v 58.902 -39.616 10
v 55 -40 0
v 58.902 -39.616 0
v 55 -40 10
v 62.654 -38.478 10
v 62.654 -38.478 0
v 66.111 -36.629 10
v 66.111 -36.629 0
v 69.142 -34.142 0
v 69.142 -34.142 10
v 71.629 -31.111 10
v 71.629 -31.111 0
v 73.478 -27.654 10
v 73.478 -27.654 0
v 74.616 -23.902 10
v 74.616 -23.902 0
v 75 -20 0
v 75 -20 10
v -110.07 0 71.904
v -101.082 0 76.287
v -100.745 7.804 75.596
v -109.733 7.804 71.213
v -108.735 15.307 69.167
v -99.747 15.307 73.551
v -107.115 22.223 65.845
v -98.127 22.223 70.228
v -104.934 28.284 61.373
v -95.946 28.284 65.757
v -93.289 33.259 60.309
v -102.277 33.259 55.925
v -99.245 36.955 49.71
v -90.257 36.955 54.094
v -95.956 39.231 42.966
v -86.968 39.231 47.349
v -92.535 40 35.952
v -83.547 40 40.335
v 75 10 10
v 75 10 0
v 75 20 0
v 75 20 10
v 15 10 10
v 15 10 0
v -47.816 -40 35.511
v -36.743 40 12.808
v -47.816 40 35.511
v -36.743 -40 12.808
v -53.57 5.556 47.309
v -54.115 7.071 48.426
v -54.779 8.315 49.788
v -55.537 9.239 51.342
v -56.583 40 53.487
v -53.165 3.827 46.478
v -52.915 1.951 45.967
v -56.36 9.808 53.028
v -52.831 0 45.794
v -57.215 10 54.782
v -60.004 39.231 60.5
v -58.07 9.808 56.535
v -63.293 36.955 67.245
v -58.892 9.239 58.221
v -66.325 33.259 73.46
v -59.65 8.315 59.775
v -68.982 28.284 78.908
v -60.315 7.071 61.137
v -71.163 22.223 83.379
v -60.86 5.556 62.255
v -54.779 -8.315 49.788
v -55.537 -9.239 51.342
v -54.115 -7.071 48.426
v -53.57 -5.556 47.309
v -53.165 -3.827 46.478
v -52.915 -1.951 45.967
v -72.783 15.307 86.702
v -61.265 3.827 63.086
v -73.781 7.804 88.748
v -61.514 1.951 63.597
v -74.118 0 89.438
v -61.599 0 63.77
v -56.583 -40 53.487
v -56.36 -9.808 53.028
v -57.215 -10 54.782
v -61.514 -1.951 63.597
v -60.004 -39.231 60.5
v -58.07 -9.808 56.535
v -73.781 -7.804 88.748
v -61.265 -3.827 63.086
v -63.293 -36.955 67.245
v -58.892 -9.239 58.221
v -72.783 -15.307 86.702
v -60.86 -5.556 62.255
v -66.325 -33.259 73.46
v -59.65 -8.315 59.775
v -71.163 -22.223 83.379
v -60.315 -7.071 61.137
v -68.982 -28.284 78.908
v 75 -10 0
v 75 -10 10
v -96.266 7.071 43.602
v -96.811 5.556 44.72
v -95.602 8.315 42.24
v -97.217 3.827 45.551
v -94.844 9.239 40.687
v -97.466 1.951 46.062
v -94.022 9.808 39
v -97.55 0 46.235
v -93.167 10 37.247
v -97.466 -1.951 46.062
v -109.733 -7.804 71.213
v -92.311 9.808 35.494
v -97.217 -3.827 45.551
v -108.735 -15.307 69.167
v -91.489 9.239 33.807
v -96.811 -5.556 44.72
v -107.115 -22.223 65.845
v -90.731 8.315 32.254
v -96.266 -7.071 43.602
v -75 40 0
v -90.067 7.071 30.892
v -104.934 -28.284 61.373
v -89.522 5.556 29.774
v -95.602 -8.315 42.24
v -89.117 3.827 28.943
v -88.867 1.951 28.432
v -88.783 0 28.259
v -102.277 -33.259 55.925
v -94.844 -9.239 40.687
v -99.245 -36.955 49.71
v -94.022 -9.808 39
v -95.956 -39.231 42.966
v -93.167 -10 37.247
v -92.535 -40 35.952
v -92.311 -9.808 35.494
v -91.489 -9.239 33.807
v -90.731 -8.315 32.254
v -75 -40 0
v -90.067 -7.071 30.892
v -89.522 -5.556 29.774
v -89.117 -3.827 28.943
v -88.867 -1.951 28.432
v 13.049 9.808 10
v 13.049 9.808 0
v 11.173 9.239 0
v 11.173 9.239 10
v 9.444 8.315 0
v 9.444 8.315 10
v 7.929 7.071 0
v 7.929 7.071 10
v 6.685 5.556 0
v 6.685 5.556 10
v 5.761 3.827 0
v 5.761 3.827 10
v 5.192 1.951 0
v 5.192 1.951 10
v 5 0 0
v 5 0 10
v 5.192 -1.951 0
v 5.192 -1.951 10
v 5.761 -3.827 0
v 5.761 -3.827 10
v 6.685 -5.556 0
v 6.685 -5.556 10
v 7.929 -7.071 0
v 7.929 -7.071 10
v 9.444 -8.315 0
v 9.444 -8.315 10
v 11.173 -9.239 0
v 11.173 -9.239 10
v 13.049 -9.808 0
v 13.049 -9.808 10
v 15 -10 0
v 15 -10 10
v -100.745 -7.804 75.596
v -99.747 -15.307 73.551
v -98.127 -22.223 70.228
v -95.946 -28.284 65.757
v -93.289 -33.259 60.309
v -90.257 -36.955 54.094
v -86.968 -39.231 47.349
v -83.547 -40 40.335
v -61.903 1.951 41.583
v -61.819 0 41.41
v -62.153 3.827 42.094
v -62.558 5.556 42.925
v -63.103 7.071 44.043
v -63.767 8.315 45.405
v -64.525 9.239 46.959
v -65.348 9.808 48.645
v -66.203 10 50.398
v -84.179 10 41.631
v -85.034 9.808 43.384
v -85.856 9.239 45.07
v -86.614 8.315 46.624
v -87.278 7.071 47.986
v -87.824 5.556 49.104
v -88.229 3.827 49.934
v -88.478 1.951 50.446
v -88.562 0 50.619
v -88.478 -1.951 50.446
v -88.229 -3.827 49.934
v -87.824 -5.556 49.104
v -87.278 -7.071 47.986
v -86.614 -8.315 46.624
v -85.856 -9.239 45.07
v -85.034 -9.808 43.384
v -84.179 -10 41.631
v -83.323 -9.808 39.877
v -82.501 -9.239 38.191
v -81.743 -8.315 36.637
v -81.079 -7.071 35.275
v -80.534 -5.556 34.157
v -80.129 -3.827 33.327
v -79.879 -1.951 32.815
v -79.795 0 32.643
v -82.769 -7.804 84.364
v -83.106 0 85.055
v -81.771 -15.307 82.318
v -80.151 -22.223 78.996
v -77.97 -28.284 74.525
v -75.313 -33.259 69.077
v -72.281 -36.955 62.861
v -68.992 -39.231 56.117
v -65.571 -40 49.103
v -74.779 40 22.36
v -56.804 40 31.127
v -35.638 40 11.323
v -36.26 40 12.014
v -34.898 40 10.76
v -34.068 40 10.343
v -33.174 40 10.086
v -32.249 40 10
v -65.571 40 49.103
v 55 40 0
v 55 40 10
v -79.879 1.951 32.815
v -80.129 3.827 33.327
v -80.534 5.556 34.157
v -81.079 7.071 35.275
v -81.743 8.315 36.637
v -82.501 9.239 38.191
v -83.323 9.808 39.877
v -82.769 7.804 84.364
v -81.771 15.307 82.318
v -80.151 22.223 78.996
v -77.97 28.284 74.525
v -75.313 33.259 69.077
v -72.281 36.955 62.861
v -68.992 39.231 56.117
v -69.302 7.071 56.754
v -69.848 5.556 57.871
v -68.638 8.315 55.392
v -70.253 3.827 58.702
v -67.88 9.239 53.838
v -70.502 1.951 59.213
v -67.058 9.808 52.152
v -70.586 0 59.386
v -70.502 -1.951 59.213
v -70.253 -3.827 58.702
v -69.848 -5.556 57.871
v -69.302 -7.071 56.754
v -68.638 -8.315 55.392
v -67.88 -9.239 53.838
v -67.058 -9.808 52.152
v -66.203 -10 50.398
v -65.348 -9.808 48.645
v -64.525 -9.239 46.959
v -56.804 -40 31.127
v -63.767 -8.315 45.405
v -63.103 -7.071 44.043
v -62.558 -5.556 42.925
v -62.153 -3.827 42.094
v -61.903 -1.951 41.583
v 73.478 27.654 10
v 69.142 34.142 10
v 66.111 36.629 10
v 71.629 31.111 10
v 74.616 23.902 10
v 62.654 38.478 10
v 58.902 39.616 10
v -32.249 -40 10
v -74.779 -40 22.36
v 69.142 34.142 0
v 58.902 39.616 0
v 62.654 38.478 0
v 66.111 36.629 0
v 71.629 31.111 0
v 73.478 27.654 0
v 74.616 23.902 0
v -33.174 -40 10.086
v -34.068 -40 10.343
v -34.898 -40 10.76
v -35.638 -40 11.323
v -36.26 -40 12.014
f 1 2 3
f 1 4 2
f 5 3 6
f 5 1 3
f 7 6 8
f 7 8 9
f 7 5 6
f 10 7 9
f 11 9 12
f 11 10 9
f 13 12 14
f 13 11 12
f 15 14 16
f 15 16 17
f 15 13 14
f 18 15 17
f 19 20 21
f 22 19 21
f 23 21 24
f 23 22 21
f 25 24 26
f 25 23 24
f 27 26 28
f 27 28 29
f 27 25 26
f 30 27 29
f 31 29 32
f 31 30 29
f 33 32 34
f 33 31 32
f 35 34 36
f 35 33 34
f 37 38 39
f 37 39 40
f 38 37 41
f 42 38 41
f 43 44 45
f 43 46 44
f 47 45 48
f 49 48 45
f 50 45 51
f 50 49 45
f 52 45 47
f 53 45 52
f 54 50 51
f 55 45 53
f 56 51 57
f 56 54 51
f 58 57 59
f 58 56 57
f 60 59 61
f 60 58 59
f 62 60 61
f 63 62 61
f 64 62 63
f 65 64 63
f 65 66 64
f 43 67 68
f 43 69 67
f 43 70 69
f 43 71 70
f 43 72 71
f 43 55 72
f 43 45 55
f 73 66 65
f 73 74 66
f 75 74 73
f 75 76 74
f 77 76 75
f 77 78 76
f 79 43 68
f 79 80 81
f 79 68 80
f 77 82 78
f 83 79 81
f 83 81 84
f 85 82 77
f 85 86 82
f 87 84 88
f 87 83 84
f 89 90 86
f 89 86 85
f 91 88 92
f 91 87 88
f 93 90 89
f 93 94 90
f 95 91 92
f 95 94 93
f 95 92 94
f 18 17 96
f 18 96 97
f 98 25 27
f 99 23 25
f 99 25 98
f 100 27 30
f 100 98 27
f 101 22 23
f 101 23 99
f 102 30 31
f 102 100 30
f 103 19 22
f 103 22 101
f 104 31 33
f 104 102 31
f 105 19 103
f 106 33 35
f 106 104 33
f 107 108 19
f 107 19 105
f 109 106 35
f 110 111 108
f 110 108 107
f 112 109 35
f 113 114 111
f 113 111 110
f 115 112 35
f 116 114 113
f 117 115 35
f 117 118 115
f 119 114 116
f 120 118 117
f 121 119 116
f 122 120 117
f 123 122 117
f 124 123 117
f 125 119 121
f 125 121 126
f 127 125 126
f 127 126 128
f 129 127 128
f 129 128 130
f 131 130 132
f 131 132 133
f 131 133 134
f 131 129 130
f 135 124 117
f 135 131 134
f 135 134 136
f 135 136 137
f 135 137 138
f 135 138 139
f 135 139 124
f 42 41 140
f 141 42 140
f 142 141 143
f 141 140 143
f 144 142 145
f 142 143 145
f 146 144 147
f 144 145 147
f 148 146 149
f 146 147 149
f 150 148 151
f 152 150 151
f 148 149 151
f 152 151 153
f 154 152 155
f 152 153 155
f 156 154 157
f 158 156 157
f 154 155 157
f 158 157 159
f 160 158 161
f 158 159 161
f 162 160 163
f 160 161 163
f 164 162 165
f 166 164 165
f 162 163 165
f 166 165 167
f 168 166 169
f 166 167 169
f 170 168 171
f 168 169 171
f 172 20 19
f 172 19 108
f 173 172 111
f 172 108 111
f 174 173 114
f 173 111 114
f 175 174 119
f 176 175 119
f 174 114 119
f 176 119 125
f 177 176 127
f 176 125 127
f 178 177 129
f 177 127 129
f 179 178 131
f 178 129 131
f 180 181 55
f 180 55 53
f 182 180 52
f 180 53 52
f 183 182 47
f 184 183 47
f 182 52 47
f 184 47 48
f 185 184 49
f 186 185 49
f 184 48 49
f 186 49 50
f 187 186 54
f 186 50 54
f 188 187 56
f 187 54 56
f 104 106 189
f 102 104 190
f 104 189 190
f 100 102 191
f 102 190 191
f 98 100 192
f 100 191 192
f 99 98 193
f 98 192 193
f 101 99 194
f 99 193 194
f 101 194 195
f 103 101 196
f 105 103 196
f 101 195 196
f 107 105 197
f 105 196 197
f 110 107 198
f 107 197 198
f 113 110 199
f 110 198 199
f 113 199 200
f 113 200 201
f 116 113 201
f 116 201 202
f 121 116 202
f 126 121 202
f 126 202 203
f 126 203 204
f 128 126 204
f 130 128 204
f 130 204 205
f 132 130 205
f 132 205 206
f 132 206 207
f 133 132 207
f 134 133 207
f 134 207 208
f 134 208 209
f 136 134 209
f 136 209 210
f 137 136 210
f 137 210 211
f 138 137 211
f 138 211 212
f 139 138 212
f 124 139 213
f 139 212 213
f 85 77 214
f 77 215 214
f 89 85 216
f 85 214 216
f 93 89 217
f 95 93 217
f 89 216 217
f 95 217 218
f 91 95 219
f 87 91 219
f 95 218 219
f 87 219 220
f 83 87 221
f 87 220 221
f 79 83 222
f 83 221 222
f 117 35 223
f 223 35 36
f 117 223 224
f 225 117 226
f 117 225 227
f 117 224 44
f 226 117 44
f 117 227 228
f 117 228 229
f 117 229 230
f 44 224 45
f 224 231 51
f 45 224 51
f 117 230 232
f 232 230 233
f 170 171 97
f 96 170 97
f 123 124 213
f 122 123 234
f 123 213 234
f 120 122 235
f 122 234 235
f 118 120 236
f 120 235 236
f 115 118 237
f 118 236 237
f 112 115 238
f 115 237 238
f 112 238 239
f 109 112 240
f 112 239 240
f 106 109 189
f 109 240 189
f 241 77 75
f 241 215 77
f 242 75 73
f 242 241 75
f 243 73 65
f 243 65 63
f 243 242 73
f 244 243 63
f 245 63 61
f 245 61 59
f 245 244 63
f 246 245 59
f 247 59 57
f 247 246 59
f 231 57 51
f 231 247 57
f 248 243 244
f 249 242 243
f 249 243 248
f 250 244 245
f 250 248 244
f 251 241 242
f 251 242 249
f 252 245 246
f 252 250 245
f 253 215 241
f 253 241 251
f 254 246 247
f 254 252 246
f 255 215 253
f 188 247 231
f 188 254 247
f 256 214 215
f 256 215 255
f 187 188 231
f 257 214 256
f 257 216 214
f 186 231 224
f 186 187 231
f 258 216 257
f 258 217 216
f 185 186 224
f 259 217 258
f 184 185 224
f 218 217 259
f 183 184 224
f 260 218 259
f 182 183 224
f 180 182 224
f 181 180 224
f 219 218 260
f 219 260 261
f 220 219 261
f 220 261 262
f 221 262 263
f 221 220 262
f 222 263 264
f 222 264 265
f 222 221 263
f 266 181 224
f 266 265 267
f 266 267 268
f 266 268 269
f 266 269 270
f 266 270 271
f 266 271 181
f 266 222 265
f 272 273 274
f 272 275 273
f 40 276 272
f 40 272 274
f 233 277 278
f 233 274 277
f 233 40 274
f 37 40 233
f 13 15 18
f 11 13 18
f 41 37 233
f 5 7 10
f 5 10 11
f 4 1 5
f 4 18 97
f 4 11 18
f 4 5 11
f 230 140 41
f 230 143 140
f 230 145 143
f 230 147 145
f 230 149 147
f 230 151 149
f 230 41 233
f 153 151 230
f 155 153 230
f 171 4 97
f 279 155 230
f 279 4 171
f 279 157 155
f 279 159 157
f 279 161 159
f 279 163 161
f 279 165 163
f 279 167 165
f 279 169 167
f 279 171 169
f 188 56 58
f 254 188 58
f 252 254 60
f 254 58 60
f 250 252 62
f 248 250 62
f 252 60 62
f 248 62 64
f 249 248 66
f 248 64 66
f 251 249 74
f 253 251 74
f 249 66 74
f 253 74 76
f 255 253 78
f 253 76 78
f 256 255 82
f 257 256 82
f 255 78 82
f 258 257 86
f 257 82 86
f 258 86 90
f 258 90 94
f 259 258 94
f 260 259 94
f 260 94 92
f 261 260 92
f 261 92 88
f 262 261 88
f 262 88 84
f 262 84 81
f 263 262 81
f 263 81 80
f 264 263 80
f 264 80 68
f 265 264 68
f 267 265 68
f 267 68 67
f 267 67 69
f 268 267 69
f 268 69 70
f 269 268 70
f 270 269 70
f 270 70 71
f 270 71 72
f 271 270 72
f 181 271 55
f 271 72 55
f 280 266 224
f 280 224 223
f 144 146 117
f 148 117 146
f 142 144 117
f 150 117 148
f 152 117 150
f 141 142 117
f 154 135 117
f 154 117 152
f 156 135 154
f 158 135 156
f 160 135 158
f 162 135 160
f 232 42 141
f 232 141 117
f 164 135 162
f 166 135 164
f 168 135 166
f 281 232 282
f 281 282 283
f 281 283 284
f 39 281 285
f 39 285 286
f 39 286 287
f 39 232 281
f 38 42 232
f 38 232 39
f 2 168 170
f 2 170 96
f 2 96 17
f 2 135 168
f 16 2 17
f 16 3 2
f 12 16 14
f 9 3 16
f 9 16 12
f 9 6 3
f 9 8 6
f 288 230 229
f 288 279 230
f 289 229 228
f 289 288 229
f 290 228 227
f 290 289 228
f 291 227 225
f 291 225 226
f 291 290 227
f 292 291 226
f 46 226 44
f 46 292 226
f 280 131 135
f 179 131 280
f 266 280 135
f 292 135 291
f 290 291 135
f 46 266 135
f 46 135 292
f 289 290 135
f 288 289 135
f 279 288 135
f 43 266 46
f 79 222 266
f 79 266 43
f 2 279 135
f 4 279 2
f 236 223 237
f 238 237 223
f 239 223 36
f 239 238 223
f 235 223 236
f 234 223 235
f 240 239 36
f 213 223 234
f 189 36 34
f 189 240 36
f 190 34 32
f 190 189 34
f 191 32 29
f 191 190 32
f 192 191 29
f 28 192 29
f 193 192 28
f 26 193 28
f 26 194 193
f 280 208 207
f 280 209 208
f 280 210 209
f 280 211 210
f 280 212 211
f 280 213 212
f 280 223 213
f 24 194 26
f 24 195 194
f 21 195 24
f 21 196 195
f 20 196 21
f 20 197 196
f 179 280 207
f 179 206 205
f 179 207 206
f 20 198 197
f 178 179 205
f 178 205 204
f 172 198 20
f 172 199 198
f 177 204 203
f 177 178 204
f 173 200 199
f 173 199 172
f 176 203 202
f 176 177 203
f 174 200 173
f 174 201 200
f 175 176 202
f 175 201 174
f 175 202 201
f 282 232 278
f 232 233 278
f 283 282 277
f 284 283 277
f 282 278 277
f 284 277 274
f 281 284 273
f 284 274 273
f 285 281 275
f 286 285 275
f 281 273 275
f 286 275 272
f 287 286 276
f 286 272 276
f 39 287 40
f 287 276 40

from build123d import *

# Parameters (mm, degrees)
F1_DEPTH      = 40
F1_DEPTH_BACK = 40
F2_R          = 39.99999
F4_DEPTH      = 25
F5_R          = 20
F6_R          = 5
F8_DEPTH      = 63


# Not quite as in the source:
# - a fillet or chamfer is up to 0.001 mm smaller than in the source, because OpenCascade refuses the exact size


with BuildPart() as f1:
    # F0 (on Front) → F1 (new body, two sides)
    with BuildSketch(Plane.XZ) as f1_sk:
        Polygon((-75, 0), (0, 0), (75, 0), (75, 10), (-35.3732482667, 10), (-47.8156610838, 35.5107267975), (-74.1179298912, 89.4383695755), (-83.1058703542, 85.0546581076), (-56.8036015468, 31.1270153297), (-74.7794824728, 22.3595923939), (-101.0817512801, 76.2872351718), (-110.0696917431, 71.9035237039), align=None)
    extrude(amount=F1_DEPTH)
    extrude(f1_sk.sketch, amount=-F1_DEPTH_BACK)

    # F2 (radius 40 in the source; OpenCascade refuses exactly that, so slightly less here)
    f2_edges = [f1.edges().sort_by_distance(p)[0] for p in [
        (-78.6119, -40, 87.246514),
        (-78.6119, 40, 87.246514),
        (-105.575722, -40, 74.095379),
        (-105.575722, 40, 74.095379),
    ]]
    fillet(f2_edges, radius=F2_R)

    # F3 (on face) → F4 (cut)
    with BuildSketch(Plane.XY.offset(10)):
        with BuildLine():
            Line((75, 10), (15, 10))
            ThreePointArc((15, 10), (5, 0), (15, -10))
            Line((15, -10), (75, -10))
            Line((75, -10), (75, 10))
        make_face()
    extrude(amount=-F4_DEPTH, mode=Mode.SUBTRACT)

    # F5
    f5_edges = [f1.edges().sort_by_distance(p)[0] for p in [
        (75, 40, 5),
        (75, -40, 5),
    ]]
    fillet(f5_edges, radius=F5_R)

    # F6
    f6_edges = [f1.edges().sort_by_distance(p)[0] for p in [
        (-35.373248, 0, 10),
    ]]
    fillet(f6_edges, radius=F6_R)

    # F7 (on face) → F8 (cut)
    with BuildSketch(Plane(origin=(-24.6355434727, 0, -12.0155573887), x_dir=(0, 1, 0), z_dir=(0.8987940463, 0, 0.4383711468))):
        with BuildLine():
            ThreePointArc((0, 64.3188986308), (7.0710678119, 67.247830819), (10, 74.3188986308))
            ThreePointArc((10, 74.3188986308), (-7.0710678119, 81.3899664427), (0, 64.3188986308))
        make_face()
    extrude(amount=-F8_DEPTH, mode=Mode.SUBTRACT)


solid = f1.part
